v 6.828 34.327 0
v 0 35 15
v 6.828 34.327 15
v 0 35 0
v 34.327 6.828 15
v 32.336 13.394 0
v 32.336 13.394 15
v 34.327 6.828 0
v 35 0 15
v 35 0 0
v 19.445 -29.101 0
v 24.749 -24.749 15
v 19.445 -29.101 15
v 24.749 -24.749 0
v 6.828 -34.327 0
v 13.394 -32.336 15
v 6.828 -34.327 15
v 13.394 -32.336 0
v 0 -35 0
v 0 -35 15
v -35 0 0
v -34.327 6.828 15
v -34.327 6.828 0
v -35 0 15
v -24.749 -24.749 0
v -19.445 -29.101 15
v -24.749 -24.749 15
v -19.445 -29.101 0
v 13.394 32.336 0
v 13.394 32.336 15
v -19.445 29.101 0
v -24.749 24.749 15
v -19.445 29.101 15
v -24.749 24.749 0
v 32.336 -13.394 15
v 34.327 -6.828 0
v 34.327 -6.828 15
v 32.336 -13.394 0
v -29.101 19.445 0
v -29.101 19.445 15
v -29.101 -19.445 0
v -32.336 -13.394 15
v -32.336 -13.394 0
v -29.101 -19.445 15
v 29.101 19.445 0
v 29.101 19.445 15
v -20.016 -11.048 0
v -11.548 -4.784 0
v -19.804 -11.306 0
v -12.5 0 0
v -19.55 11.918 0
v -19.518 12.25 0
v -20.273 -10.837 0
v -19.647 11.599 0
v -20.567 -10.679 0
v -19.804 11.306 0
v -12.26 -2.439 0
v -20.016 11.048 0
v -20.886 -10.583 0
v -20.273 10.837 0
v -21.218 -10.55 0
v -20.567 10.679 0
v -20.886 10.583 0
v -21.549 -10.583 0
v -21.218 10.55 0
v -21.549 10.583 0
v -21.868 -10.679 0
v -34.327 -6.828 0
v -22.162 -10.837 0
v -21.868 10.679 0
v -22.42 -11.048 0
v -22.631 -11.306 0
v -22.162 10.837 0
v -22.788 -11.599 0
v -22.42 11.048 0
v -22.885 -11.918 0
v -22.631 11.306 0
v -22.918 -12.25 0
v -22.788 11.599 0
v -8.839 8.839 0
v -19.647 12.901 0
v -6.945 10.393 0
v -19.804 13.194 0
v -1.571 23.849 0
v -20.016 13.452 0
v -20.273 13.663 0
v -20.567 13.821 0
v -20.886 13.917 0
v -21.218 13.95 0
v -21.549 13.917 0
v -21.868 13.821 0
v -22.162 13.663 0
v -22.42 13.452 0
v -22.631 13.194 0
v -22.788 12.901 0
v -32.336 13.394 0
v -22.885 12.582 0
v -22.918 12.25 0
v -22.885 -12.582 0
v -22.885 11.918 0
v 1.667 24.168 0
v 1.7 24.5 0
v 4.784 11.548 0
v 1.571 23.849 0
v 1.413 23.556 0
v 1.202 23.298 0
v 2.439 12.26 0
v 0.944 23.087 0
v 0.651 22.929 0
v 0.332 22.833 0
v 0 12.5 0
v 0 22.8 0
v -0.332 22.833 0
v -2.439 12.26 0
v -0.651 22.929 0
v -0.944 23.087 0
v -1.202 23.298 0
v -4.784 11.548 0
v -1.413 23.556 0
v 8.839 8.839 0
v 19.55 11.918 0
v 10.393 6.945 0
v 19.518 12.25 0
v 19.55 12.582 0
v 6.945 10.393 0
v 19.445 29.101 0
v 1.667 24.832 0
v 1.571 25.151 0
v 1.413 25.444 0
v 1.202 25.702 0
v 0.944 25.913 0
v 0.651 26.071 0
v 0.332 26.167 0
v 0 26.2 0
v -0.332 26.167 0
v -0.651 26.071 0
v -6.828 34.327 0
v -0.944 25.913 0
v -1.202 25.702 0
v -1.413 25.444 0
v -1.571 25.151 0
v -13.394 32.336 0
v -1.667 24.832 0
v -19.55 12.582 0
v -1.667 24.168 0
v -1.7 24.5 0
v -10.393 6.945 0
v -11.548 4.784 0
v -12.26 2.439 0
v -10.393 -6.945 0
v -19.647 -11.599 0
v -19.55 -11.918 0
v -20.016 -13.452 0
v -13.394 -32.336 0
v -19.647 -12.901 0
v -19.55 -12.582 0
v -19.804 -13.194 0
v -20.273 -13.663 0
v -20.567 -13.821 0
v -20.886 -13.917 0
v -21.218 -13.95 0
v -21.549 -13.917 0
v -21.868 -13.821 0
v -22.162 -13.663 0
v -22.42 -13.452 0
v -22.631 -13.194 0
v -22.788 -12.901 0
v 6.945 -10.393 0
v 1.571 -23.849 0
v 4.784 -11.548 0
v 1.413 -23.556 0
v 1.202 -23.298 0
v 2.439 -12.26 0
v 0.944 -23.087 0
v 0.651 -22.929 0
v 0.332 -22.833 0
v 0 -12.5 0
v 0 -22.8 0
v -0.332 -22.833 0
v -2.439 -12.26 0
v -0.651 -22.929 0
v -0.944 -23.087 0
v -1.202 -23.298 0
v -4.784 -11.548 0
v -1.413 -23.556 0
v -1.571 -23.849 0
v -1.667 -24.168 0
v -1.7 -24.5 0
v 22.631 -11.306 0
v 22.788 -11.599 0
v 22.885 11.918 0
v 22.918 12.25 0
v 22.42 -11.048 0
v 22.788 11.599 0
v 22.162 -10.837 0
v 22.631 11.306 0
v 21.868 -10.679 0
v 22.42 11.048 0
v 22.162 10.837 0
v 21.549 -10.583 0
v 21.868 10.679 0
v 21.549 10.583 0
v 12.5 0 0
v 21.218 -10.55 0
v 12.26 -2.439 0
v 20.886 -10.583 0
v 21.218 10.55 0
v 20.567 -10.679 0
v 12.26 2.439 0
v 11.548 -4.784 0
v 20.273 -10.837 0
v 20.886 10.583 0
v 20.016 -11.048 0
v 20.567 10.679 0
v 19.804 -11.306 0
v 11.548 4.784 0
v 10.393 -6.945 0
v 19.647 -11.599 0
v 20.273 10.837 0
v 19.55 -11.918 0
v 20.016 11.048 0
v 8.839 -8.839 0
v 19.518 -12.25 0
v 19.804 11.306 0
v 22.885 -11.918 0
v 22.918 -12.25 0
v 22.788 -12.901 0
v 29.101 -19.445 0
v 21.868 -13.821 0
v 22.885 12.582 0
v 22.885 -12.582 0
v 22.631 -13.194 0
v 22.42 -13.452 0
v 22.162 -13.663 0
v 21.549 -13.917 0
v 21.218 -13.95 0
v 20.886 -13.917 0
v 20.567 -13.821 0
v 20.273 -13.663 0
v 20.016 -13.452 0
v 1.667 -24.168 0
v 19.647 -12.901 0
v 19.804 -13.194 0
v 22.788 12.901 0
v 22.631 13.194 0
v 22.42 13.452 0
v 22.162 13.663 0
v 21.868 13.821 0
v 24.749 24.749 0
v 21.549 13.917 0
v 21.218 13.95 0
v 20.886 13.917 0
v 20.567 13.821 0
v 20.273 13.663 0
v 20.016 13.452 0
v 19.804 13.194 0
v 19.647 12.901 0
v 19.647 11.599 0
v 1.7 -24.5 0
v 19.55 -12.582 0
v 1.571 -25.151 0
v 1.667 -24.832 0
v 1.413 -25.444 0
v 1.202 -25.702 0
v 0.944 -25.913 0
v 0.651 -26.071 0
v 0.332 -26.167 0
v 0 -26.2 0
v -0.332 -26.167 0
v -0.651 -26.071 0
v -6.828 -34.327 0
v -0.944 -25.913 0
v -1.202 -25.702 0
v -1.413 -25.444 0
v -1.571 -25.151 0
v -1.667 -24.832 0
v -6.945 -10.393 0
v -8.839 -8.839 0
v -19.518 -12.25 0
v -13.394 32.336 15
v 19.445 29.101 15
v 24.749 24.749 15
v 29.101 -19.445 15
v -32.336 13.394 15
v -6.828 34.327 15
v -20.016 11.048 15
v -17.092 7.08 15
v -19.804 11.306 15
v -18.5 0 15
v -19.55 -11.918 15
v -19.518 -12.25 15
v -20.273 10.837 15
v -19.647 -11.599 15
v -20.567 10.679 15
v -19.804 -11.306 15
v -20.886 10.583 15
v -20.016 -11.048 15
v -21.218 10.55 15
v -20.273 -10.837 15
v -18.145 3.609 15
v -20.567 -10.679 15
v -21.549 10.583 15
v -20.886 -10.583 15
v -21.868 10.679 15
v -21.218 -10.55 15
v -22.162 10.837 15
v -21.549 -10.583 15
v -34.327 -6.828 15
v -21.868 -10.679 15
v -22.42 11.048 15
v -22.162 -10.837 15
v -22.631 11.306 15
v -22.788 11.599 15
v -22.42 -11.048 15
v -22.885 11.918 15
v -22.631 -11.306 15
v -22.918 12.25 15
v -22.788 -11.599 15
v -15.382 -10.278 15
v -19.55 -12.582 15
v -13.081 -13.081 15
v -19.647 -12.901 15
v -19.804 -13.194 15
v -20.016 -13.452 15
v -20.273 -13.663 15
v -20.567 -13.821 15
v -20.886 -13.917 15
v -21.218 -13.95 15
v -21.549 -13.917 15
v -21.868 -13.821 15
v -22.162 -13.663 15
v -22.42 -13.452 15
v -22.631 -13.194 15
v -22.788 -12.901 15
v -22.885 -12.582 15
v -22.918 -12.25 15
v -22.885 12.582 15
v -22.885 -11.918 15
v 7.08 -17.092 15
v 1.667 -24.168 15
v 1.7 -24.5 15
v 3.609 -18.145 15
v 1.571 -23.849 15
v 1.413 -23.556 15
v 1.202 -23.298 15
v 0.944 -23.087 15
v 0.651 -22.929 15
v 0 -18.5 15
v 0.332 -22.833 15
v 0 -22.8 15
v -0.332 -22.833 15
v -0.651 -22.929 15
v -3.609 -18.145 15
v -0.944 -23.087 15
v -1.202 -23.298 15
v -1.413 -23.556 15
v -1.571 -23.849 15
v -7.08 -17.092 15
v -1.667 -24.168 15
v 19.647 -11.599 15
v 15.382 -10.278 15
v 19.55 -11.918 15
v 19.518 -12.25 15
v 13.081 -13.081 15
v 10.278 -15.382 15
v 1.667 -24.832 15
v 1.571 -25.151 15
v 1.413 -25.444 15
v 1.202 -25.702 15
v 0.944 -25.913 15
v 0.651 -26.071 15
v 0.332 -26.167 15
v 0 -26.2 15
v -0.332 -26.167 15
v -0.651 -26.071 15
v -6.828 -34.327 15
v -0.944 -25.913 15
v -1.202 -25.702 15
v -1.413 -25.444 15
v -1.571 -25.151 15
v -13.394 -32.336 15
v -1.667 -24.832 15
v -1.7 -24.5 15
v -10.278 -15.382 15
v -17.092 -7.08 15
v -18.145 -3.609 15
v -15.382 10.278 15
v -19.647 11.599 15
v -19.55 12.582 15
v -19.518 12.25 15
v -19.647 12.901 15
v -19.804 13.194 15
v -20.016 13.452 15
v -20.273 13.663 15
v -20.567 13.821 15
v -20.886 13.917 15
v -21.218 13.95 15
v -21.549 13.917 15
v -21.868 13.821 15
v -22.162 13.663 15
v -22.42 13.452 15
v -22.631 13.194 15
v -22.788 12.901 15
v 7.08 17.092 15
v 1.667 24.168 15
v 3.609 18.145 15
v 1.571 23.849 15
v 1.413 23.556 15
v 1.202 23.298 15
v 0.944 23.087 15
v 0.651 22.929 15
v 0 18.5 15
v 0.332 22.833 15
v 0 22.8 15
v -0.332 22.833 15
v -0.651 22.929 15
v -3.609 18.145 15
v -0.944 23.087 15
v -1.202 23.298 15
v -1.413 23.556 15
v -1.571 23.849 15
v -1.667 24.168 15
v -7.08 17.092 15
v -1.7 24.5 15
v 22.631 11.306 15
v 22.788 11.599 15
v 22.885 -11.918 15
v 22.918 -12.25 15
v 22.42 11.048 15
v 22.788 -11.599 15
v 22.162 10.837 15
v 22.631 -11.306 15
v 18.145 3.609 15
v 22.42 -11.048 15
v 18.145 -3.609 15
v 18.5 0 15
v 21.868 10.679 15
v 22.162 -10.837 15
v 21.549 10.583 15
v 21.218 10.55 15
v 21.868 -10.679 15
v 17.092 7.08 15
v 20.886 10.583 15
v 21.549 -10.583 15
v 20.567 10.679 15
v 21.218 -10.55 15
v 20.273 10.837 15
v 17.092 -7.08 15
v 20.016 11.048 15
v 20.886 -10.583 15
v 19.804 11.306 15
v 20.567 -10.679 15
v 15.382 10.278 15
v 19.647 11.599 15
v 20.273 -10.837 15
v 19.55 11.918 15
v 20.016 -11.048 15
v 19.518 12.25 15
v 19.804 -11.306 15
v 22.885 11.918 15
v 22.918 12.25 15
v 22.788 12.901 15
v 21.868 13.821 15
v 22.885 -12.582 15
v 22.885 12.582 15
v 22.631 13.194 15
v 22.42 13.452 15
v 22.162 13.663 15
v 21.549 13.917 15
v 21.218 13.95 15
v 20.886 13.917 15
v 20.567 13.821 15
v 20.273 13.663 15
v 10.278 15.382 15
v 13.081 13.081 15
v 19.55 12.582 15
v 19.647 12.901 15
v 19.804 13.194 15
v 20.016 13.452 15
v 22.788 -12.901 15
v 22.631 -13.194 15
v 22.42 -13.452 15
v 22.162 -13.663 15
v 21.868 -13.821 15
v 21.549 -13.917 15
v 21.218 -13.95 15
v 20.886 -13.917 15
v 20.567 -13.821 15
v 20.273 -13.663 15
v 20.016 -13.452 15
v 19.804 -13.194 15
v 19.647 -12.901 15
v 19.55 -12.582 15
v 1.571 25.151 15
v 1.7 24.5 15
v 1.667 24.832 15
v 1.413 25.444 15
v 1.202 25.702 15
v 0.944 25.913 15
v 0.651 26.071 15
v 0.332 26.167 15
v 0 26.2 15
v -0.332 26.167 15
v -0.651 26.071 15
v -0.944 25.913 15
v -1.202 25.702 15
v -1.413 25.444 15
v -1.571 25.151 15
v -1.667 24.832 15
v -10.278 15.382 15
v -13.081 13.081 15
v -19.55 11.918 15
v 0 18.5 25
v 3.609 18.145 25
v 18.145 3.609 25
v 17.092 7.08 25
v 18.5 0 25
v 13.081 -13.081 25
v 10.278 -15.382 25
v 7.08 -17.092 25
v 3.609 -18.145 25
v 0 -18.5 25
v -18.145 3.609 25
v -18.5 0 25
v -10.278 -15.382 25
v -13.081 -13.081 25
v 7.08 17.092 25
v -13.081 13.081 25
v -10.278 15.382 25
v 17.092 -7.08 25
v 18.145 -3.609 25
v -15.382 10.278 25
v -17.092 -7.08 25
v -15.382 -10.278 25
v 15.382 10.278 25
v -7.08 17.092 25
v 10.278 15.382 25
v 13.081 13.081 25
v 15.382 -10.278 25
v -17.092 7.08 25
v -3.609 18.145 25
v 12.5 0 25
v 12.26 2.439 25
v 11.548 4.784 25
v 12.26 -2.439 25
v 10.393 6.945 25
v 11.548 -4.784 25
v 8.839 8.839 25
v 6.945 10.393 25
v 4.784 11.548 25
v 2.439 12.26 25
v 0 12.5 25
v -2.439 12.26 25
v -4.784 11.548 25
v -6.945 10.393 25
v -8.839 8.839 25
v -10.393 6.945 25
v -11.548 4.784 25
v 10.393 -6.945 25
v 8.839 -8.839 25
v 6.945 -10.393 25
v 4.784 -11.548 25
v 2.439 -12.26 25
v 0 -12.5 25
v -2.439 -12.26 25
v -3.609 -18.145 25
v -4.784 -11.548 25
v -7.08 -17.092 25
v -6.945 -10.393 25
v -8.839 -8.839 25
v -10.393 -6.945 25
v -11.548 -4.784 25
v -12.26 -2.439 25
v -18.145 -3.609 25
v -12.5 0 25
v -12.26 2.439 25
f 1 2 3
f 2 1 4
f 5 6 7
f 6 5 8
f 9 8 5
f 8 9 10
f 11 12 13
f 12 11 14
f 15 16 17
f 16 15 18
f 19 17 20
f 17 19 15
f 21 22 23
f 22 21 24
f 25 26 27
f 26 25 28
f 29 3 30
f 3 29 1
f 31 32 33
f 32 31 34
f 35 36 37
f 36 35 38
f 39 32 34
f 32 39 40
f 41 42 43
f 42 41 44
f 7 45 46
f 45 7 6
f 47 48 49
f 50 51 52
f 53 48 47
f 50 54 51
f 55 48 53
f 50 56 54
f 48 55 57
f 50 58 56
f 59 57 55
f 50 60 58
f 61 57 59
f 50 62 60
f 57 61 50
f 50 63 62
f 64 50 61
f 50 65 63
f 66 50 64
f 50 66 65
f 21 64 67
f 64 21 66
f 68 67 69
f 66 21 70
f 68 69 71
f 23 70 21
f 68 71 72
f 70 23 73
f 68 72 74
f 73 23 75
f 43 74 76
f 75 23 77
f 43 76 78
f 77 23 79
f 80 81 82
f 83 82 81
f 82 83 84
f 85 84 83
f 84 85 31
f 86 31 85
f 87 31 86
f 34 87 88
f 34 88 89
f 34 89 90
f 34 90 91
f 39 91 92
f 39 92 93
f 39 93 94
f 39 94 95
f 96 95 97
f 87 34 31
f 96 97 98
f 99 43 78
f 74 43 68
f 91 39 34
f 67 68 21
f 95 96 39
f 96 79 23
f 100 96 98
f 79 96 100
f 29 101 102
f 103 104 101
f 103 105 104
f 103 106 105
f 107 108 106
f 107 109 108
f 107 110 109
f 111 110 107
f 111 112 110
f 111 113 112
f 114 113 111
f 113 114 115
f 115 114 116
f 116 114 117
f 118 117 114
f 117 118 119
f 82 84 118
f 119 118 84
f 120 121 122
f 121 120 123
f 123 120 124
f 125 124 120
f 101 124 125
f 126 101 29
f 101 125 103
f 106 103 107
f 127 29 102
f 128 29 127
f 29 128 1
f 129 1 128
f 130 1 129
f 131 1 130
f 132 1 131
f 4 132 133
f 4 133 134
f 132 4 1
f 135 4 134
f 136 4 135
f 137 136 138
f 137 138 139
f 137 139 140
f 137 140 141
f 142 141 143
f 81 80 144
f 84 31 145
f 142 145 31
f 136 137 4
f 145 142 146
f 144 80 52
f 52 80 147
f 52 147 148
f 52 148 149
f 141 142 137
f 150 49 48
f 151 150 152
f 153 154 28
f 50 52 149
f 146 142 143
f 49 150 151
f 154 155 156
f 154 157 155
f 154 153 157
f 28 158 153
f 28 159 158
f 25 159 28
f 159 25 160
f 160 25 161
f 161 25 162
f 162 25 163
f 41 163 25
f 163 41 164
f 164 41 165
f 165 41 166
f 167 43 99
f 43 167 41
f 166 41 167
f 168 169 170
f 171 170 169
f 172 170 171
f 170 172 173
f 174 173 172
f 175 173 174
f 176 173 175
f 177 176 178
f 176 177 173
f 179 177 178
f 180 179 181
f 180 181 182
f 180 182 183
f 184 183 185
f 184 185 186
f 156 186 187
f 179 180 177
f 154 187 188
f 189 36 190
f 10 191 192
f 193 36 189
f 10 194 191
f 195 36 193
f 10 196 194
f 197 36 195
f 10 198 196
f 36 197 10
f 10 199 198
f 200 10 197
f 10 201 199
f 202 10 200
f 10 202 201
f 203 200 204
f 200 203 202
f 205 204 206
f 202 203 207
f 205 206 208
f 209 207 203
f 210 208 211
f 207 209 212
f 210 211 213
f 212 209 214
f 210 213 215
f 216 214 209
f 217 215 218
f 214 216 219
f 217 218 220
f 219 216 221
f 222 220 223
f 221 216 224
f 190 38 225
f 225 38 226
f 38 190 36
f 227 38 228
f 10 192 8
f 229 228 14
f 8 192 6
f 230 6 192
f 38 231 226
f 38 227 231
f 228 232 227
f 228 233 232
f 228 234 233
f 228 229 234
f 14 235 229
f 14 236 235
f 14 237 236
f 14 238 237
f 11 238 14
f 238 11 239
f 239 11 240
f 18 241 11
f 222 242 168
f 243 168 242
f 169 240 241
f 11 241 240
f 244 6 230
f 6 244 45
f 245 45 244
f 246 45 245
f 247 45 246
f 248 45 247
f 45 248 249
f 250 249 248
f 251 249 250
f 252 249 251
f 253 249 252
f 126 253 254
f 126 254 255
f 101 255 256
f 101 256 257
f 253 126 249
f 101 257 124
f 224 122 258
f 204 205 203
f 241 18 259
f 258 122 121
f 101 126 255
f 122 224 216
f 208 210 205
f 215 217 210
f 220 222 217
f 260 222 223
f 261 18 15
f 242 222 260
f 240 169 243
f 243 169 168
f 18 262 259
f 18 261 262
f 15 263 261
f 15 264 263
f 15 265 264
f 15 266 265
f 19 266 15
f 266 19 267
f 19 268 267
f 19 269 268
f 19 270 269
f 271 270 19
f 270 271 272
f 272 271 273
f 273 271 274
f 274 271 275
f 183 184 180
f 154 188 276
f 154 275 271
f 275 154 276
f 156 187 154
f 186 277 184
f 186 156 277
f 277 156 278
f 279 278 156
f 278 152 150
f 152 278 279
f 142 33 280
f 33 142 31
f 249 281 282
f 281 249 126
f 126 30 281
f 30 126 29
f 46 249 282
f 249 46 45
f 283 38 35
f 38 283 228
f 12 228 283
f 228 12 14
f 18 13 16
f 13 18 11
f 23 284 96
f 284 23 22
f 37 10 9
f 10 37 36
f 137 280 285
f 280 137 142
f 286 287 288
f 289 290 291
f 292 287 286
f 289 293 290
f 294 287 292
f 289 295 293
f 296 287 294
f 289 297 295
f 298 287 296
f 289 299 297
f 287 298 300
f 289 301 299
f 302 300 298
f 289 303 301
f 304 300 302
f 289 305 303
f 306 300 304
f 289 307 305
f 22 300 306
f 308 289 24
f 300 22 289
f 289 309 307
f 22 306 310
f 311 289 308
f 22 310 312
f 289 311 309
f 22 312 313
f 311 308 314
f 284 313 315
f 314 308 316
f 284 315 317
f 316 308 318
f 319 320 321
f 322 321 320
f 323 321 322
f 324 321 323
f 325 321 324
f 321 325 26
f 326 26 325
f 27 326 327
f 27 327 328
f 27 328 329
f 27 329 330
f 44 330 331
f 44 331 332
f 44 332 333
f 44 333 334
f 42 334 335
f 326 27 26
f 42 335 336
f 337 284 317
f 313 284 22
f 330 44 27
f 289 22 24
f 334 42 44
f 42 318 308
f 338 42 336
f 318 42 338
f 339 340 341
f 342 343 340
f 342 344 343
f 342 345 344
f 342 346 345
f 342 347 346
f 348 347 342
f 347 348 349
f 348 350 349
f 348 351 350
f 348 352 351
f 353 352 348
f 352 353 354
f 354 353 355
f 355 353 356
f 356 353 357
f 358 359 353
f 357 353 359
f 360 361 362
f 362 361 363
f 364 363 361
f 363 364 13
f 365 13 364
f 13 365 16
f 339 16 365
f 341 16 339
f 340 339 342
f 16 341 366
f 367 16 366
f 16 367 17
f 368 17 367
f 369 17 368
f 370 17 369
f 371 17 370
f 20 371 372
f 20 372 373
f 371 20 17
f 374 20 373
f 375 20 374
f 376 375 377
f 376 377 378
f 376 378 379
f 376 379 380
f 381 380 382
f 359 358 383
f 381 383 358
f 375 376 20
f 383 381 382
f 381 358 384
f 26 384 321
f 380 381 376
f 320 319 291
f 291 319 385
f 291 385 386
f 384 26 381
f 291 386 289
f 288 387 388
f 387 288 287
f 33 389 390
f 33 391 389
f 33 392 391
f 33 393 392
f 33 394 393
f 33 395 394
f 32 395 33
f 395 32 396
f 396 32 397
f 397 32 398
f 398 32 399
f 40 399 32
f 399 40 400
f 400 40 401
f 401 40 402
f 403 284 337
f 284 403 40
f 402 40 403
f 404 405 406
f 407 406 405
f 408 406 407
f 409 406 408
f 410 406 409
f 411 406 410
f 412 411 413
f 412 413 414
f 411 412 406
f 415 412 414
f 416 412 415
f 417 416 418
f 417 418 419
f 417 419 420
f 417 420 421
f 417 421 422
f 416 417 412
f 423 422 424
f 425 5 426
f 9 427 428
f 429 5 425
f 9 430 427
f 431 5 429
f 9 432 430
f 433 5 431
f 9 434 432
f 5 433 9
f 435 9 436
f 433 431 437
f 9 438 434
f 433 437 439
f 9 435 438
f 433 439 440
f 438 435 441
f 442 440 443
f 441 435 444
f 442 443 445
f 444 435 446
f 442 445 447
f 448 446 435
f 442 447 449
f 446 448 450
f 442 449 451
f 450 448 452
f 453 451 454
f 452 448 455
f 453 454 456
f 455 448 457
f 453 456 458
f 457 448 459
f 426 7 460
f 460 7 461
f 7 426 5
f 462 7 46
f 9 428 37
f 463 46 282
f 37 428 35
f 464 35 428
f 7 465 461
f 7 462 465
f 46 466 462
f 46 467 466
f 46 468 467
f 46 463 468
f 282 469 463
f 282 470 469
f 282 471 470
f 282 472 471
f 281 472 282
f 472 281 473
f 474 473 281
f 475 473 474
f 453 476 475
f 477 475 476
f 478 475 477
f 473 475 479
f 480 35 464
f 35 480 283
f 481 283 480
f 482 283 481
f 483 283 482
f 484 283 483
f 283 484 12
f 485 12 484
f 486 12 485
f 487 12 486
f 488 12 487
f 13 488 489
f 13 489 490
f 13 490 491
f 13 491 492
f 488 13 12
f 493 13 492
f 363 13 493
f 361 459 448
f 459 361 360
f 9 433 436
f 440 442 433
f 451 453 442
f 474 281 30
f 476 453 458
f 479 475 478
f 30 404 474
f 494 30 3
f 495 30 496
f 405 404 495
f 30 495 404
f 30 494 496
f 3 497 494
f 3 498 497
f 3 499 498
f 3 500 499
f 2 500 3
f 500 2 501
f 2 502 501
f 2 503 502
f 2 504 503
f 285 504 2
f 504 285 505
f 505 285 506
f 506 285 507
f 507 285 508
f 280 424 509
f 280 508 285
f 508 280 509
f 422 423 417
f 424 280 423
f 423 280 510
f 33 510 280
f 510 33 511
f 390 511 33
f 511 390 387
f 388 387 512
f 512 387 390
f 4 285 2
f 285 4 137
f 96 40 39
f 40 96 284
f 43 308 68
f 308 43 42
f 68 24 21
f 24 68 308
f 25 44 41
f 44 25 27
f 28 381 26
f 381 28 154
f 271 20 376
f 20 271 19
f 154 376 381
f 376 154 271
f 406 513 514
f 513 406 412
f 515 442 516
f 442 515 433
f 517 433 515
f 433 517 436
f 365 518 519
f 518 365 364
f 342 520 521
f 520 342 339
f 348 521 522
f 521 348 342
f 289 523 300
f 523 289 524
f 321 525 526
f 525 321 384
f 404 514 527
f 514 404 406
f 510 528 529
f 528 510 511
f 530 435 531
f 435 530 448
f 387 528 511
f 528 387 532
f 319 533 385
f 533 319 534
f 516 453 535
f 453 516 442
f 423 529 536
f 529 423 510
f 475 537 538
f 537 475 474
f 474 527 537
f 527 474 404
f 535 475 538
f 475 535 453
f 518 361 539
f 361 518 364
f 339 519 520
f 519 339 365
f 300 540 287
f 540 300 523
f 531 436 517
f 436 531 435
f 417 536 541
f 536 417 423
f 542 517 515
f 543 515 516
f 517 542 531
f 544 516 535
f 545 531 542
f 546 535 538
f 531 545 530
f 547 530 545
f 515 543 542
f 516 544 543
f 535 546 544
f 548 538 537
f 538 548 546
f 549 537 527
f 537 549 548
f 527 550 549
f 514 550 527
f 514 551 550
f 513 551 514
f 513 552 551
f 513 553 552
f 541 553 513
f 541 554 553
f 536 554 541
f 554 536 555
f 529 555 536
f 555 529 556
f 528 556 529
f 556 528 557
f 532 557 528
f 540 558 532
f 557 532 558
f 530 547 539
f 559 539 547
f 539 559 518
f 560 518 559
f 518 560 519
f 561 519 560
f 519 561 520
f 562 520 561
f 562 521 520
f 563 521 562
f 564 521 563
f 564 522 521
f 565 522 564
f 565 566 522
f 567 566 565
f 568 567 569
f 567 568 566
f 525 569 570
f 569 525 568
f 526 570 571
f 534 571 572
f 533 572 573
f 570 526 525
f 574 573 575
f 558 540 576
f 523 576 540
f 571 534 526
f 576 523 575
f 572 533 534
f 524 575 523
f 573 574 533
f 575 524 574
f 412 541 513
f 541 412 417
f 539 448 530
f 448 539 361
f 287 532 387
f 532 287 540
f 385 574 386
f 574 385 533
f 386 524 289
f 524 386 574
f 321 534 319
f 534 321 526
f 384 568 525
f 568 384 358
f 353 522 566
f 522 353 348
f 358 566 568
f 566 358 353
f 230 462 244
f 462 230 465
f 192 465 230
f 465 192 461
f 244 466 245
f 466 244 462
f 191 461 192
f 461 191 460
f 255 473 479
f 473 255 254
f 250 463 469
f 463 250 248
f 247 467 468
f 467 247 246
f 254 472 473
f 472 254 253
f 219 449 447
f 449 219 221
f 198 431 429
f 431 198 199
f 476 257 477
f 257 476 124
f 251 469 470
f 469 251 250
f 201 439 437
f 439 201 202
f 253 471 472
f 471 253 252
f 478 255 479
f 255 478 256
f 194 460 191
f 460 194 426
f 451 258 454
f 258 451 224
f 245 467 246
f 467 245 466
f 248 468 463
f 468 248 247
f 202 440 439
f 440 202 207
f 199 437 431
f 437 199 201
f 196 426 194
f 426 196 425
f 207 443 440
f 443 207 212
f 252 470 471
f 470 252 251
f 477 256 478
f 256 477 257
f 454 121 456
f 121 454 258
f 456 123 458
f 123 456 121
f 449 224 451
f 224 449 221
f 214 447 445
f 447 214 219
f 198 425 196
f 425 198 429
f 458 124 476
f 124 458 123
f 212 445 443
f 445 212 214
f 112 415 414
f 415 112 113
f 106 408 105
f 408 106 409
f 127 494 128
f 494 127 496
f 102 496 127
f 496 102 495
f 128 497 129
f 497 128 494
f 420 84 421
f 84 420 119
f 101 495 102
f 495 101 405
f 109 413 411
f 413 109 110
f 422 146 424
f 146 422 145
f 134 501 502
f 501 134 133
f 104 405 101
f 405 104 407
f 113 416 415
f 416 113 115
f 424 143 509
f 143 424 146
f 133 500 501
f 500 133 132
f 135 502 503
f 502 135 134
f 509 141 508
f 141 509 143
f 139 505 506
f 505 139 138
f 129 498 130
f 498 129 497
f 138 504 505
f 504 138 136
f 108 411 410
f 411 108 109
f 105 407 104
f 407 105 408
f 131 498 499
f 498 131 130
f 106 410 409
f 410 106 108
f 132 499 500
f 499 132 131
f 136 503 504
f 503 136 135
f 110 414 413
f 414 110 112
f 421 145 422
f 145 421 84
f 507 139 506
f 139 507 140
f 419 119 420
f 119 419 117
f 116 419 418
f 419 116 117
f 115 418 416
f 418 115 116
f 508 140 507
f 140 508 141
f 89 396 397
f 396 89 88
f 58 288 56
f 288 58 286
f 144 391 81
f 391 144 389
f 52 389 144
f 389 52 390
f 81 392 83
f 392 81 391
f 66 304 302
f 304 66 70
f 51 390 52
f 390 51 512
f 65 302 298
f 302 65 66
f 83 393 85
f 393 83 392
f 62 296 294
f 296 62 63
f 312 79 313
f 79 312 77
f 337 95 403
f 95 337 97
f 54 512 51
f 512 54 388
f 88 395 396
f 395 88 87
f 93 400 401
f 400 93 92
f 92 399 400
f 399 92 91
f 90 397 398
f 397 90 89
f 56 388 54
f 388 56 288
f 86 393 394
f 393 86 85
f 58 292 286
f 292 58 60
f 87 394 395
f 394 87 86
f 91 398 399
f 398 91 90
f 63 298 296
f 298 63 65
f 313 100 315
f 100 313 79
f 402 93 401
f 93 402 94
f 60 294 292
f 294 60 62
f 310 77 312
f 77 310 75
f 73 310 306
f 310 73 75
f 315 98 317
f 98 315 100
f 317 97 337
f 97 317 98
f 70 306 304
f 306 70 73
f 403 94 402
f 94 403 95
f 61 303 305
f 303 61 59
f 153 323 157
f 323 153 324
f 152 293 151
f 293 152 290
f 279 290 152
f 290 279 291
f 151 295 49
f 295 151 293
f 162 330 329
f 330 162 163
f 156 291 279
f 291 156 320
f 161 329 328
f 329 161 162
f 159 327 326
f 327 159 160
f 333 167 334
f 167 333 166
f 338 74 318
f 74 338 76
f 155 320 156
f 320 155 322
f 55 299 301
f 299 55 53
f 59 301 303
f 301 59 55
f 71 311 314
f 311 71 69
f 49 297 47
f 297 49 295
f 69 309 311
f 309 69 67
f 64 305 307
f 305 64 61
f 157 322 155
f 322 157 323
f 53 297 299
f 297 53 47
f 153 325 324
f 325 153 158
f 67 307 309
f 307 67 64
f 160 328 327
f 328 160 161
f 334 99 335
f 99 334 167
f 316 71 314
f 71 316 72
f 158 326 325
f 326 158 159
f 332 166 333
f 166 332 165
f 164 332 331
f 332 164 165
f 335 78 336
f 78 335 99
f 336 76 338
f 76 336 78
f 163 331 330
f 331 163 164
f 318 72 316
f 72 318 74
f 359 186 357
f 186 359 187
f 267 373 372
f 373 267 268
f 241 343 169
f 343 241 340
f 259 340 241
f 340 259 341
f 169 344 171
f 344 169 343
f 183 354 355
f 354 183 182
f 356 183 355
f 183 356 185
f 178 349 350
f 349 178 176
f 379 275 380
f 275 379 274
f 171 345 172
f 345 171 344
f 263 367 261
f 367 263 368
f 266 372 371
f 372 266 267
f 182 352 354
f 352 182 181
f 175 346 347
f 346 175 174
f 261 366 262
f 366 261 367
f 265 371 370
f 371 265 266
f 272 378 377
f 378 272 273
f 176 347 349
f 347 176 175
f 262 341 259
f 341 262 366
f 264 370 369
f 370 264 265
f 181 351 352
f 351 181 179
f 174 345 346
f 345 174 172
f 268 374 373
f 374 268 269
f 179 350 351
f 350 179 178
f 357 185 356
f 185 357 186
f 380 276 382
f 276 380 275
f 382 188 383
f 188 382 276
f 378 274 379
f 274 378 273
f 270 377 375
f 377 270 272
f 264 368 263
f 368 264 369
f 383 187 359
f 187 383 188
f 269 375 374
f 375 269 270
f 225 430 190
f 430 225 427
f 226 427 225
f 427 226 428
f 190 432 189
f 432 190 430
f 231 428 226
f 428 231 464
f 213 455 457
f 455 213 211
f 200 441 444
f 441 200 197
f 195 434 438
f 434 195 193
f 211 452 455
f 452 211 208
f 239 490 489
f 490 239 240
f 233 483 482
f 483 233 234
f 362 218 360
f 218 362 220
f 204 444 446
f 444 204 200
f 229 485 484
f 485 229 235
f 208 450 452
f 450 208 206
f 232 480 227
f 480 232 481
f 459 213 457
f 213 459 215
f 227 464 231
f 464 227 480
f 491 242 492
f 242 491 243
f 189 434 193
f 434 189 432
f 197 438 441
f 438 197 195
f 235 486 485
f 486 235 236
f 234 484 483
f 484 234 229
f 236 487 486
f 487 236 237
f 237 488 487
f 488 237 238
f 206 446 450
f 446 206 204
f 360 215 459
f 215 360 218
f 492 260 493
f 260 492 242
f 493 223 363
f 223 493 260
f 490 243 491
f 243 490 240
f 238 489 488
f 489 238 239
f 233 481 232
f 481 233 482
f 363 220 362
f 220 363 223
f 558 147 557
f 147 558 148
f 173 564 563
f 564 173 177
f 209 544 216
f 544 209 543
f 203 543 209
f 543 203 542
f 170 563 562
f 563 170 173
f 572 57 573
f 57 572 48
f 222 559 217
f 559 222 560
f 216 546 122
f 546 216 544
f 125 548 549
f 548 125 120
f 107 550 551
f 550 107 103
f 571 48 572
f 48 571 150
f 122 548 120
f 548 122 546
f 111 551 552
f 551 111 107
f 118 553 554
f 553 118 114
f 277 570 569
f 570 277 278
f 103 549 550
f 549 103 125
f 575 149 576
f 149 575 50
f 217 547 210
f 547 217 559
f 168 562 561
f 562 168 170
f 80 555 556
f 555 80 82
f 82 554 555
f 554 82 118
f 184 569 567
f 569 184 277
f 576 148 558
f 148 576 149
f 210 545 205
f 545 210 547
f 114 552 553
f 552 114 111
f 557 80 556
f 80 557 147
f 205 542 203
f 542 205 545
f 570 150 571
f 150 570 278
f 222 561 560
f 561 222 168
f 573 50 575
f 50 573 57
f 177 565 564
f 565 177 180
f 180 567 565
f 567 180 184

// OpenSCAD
$fn = 32;

// ----------------------------------------------------------------------
// Flange Ø70 x 15
// 6 holes on a Ø49 bolt circle, bolted joints
// ----------------------------------------------------------------------

// --- parameters (mm) ---
flange_d = 70;   // outside diameter of the flange
thickness = 15;  // flange thickness
holes = 6;       // number of bolt holes
pcd = 49;        // bolt circle diameter
start_deg = 30;  // angle of the first hole, from +X
hole_d = 3.4;    // bolt hole diameter
bore_d = 25;     // central through bore
hub_d = 37;      // hub outside diameter
hub_h = 10;      // hub height above the flange face (0 = no hub)

// --- derived feature positions (mm) ---
height = thickness + hub_h;  // = 25   overall height of the part
pcd_r = pcd / 2;             // = 24.5   bolt circle radius
hole_step = 360 / holes;     // = 60   angular pitch
feature_centers = [
  [pcd_r * cos(start_deg + 0 * hole_step), pcd_r * sin(start_deg + 0 * hole_step)],
  [pcd_r * cos(start_deg + 1 * hole_step), pcd_r * sin(start_deg + 1 * hole_step)],
  [pcd_r * cos(start_deg + 2 * hole_step), pcd_r * sin(start_deg + 2 * hole_step)],
  [pcd_r * cos(start_deg + 3 * hole_step), pcd_r * sin(start_deg + 3 * hole_step)],
  [pcd_r * cos(start_deg + 4 * hole_step), pcd_r * sin(start_deg + 4 * hole_step)],
  [pcd_r * cos(start_deg + 5 * hole_step), pcd_r * sin(start_deg + 5 * hole_step)]
];   // bolt hole centres on the pitch circle

// flange disc, every hole and the bore cut straight through
difference() {
  union() {
    cylinder(d = flange_d, h = thickness);
    cylinder(d = hub_d, h = height);  // hub, overlapped into the flange
  }
  translate([0, 0, -1]) cylinder(d = bore_d, h = height + 2);  // bore, through
  for (centre = feature_centers)
    translate([centre[0], centre[1], -1]) cylinder(d = hole_d, h = thickness + 2);
}
